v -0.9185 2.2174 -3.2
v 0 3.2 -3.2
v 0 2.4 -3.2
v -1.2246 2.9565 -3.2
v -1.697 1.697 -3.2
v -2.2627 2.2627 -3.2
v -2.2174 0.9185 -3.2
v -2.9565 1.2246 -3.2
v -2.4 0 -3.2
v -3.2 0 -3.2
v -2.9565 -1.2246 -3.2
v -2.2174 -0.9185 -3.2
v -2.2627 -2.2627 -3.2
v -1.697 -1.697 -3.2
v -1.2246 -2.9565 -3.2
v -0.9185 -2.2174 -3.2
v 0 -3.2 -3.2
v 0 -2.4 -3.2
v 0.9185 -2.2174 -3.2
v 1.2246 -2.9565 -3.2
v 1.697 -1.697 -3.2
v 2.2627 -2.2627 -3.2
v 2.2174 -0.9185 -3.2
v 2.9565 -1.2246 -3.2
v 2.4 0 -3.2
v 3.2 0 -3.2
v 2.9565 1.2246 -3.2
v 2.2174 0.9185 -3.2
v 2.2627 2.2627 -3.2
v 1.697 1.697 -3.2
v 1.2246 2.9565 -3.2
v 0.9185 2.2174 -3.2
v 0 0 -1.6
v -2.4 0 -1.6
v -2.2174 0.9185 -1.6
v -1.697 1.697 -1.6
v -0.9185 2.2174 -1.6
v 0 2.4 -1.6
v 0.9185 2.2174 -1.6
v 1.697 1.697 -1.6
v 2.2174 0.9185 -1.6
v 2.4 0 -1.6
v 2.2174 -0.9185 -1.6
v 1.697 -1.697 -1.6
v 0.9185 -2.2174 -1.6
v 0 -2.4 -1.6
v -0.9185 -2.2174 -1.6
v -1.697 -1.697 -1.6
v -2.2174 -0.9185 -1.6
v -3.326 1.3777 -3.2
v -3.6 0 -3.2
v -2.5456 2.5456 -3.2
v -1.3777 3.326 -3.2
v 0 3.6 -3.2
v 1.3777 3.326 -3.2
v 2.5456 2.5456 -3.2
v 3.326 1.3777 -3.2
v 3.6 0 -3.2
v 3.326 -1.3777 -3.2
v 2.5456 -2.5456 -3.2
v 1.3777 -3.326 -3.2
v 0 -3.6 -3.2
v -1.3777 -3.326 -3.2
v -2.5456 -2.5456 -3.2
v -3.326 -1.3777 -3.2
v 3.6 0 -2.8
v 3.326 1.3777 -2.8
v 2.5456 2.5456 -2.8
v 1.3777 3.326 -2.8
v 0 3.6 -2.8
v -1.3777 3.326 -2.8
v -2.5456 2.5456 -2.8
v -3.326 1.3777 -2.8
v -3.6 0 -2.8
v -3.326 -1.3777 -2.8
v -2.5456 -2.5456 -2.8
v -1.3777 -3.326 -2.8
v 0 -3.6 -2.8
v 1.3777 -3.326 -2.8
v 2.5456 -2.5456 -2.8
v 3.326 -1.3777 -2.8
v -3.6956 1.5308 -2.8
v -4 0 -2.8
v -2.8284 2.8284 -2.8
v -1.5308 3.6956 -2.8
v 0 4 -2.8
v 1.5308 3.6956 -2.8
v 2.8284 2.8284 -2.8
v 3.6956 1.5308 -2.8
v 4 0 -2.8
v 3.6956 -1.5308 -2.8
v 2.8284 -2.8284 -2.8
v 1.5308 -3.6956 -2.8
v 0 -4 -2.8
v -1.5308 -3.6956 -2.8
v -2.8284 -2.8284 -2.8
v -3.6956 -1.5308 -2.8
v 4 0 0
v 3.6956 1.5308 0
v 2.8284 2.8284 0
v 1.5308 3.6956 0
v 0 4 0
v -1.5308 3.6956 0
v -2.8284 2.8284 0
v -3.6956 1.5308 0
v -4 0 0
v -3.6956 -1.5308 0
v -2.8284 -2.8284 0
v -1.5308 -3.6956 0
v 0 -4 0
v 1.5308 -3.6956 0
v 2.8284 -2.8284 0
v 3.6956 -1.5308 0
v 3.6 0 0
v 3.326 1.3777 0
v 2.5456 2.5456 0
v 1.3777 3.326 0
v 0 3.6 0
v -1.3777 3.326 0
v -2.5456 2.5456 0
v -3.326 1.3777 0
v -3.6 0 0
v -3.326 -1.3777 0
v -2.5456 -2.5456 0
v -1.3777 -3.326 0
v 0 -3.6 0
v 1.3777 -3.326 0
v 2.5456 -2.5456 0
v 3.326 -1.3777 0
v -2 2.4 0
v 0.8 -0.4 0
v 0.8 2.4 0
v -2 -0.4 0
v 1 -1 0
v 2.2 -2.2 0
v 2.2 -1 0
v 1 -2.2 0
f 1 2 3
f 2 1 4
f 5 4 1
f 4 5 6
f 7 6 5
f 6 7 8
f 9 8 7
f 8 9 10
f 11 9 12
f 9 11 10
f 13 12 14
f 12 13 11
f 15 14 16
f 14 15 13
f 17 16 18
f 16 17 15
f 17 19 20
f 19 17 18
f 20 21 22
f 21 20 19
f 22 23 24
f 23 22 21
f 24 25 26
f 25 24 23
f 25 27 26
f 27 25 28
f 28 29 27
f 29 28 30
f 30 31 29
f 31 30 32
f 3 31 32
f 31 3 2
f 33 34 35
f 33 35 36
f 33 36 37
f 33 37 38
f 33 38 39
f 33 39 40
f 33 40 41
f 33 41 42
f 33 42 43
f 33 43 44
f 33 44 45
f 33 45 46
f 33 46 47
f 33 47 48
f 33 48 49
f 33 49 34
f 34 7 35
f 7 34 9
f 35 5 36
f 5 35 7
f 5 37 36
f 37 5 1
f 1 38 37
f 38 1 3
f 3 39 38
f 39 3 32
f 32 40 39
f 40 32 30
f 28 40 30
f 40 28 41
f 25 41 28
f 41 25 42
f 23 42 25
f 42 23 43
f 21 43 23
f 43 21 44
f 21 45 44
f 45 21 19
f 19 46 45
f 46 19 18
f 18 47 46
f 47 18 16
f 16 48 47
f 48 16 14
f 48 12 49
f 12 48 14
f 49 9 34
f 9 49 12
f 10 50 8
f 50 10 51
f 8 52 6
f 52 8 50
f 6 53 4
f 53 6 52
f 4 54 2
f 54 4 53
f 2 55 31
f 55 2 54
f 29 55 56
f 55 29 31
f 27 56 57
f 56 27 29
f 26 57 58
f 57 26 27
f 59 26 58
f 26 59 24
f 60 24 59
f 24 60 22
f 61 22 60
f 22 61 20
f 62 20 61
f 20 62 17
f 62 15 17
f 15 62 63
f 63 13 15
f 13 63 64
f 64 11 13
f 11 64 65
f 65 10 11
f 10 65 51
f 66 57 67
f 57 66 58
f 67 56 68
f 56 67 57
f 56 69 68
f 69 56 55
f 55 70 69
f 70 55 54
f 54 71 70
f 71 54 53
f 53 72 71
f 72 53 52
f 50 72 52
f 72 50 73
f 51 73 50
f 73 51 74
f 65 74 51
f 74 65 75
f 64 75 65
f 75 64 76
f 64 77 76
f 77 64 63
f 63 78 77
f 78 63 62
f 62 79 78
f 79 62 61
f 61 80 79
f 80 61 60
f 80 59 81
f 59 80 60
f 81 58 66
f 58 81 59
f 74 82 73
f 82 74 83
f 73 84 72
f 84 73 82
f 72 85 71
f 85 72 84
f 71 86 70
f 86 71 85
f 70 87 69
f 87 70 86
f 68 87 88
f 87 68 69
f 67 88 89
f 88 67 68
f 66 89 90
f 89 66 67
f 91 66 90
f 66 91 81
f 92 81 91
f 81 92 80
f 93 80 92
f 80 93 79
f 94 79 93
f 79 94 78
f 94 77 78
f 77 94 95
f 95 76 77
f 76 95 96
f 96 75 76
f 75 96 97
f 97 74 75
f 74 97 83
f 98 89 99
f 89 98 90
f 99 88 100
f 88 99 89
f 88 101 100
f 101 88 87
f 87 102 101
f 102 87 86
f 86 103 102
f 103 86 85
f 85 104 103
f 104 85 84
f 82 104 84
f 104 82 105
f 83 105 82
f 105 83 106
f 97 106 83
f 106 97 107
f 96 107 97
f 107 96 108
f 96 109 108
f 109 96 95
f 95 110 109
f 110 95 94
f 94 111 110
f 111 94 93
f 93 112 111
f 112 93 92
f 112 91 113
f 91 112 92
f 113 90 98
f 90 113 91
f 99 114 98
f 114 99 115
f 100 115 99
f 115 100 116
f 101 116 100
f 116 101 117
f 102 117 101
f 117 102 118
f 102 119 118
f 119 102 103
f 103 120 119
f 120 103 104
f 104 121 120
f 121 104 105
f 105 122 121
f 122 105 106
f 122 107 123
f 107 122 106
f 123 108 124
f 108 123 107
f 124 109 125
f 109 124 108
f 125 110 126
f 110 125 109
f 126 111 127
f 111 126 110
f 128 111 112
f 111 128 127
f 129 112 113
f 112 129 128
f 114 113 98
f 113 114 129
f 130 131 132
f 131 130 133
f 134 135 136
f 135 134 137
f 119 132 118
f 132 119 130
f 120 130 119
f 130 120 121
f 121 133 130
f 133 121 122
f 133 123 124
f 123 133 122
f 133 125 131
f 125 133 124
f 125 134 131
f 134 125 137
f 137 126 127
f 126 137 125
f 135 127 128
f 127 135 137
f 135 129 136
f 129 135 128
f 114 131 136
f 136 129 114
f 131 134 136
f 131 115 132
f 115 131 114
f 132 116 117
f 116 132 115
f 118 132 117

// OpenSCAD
// file: ../p/4-4disc.scad
use <../lib.scad>
function ldraw_lib__4_4disc() = [
// 0 Disc 1.0
// 0 Name: 4-4disc.dat
// 0 Author: James Jessiman
// 0 !LDRAW_ORG Primitive UPDATE 2002-02
// 0 !LICENSE Licensed under CC BY 4.0 : see CAreadme.txt
// 
// 0 BFC CERTIFY CCW
  [0,"BFC","CERTIFY"],
  [0,"BFC","CCW"],
// 
// 0 !HISTORY 1998-12-15 [PTadmin] Official Update 1998-10
// 0 !HISTORY 2002-03-23 [sbliss] Added BFC statement
// 0 !HISTORY 2002-04-25 [PTadmin] Official Update 2002-02
// 0 !HISTORY 2007-06-24 [PTadmin] Header formatted for Contributor Agreement
// 0 !HISTORY 2008-07-01 [PTadmin] Official Update 2008-01
// 
// 
// 3 16 0 0 0 1 0 0 0.9239 0 0.3827
  [3,16,0,0,0,1,0,0,0.9239,0,0.3827],
// 3 16 0 0 0 0.9239 0 0.3827 0.7071 0 0.7071
  [3,16,0,0,0,0.9239,0,0.3827,0.7071,0,0.7071],
// 3 16 0 0 0 0.7071 0 0.7071 0.3827 0 0.9239
  [3,16,0,0,0,0.7071,0,0.7071,0.3827,0,0.9239],
// 3 16 0 0 0 0.3827 0 0.9239 0 0 1
  [3,16,0,0,0,0.3827,0,0.9239,0,0,1],
// 3 16 0 0 0 0 0 1 -0.3827 0 0.9239
  [3,16,0,0,0,0,0,1,-0.3827,0,0.9239],
// 3 16 0 0 0 -0.3827 0 0.9239 -0.7071 0 0.7071
  [3,16,0,0,0,-0.3827,0,0.9239,-0.7071,0,0.7071],
// 3 16 0 0 0 -0.7071 0 0.7071 -0.9239 0 0.3827
  [3,16,0,0,0,-0.7071,0,0.7071,-0.9239,0,0.3827],
// 3 16 0 0 0 -0.9239 0 0.3827 -1 0 -0
  [3,16,0,0,0,-0.9239,0,0.3827,-1,0,-0],
// 3 16 0 0 0 -1 0 -0 -0.9239 0 -0.3827
  [3,16,0,0,0,-1,0,-0,-0.9239,0,-0.3827],
// 3 16 0 0 0 -0.9239 0 -0.3827 -0.7071 0 -0.7071
  [3,16,0,0,0,-0.9239,0,-0.3827,-0.7071,0,-0.7071],
// 3 16 0 0 0 -0.7071 0 -0.7071 -0.3827 0 -0.9239
  [3,16,0,0,0,-0.7071,0,-0.7071,-0.3827,0,-0.9239],
// 3 16 0 0 0 -0.3827 0 -0.9239 0 0 -1
  [3,16,0,0,0,-0.3827,0,-0.9239,0,0,-1],
// 3 16 0 0 0 0 0 -1 0.3827 0 -0.9239
  [3,16,0,0,0,0,0,-1,0.3827,0,-0.9239],
// 3 16 0 0 0 0.3827 0 -0.9239 0.7071 0 -0.7071
  [3,16,0,0,0,0.3827,0,-0.9239,0.7071,0,-0.7071],
// 3 16 0 0 0 0.7071 0 -0.7071 0.9239 0 -0.3827
  [3,16,0,0,0,0.7071,0,-0.7071,0.9239,0,-0.3827],
// 3 16 0 0 0 0.9239 0 -0.3827 1 0 0
  [3,16,0,0,0,0.9239,0,-0.3827,1,0,0],
// 0
];
module ldraw_lib__4_4disc(step=0, col=false, unit=2/5, alt=false, line=0.2, solid=!$preview)
    makepoly(ldraw_lib__4_4disc(), step=step, col=col, unit=unit, alt=alt, line=line, solid=solid);
ldraw_lib__4_4disc(line=0.2);
// file: ../p/4-4ring3.scad
use <../lib.scad>
function ldraw_lib__4_4ring3() = [
// 0 Ring  3 x 1.0
// 0 Name: 4-4ring3.dat
// 0 Author: James Jessiman
// 0 !LDRAW_ORG Primitive UPDATE 2009-01
// 0 !LICENSE Licensed under CC BY 4.0 : see CAreadme.txt
// 
// 0 BFC CERTIFY CCW
  [0,"BFC","CERTIFY"],
  [0,"BFC","CCW"],
// 
// 0 !HISTORY 1998-12-15 [PTadmin] Official Update 1998-10
// 0 !HISTORY 2002-04-05 [hafhead] Added BFC statement
// 0 !HISTORY 2002-04-25 [PTadmin] Official Update 2002-02
// 0 !HISTORY 2007-06-24 [PTadmin] Header formatted for Contributor Agreement
// 0 !HISTORY 2008-07-01 [PTadmin] Official Update 2008-01
// 0 !HISTORY 2008-08-26 [cwdee] Switch polygon winding and rename
// 0 !HISTORY 2009-05-02 [PTadmin] Official Update 2009-01
// 
// 
// 4 16 -1.5308 0 3.6956 -1.1481 0 2.7717 0 0 3 0 0 4
  [4,16,-1.5308,0,3.6956,-1.1481,0,2.7717,0,0,3,0,0,4],
// 4 16 -2.8284 0 2.8284 -2.1213 0 2.1213 -1.1481 0 2.7717 -1.5308 0 3.6956
  [4,16,-2.8284,0,2.8284,-2.1213,0,2.1213,-1.1481,0,2.7717,-1.5308,0,3.6956],
// 4 16 -3.6956 0 1.5308 -2.7717 0 1.1481 -2.1213 0 2.1213 -2.8284 0 2.8284
  [4,16,-3.6956,0,1.5308,-2.7717,0,1.1481,-2.1213,0,2.1213,-2.8284,0,2.8284],
// 4 16 -4 0 0 -3 0 0 -2.7717 0 1.1481 -3.6956 0 1.5308
  [4,16,-4,0,0,-3,0,0,-2.7717,0,1.1481,-3.6956,0,1.5308],
// 4 16 -3.6956 0 -1.5308 -2.7717 0 -1.1481 -3 0 0 -4 0 0
  [4,16,-3.6956,0,-1.5308,-2.7717,0,-1.1481,-3,0,0,-4,0,0],
// 4 16 -2.8284 0 -2.8284 -2.1213 0 -2.1213 -2.7717 0 -1.1481 -3.6956 0 -1.5308
  [4,16,-2.8284,0,-2.8284,-2.1213,0,-2.1213,-2.7717,0,-1.1481,-3.6956,0,-1.5308],
// 4 16 -1.5308 0 -3.6956 -1.1481 0 -2.7717 -2.1213 0 -2.1213 -2.8284 0 -2.8284
  [4,16,-1.5308,0,-3.6956,-1.1481,0,-2.7717,-2.1213,0,-2.1213,-2.8284,0,-2.8284],
// 4 16 0 0 -4 0 0 -3 -1.1481 0 -2.7717 -1.5308 0 -3.6956
  [4,16,0,0,-4,0,0,-3,-1.1481,0,-2.7717,-1.5308,0,-3.6956],
// 4 16 1.5308 0 -3.6956 1.1481 0 -2.7717 0 0 -3 0 0 -4
  [4,16,1.5308,0,-3.6956,1.1481,0,-2.7717,0,0,-3,0,0,-4],
// 4 16 2.8284 0 -2.8284 2.1213 0 -2.1213 1.1481 0 -2.7717 1.5308 0 -3.6956
  [4,16,2.8284,0,-2.8284,2.1213,0,-2.1213,1.1481,0,-2.7717,1.5308,0,-3.6956],
// 4 16 3.6956 0 -1.5308 2.7717 0 -1.1481 2.1213 0 -2.1213 2.8284 0 -2.8284
  [4,16,3.6956,0,-1.5308,2.7717,0,-1.1481,2.1213,0,-2.1213,2.8284,0,-2.8284],
// 4 16 4 0 0 3 0 0 2.7717 0 -1.1481 3.6956 0 -1.5308
  [4,16,4,0,0,3,0,0,2.7717,0,-1.1481,3.6956,0,-1.5308],
// 4 16 3.6956 0 1.5308 2.7717 0 1.1481 3 0 0 4 0 0
  [4,16,3.6956,0,1.5308,2.7717,0,1.1481,3,0,0,4,0,0],
// 4 16 2.8284 0 2.8284 2.1213 0 2.1213 2.7717 0 1.1481 3.6956 0 1.5308
  [4,16,2.8284,0,2.8284,2.1213,0,2.1213,2.7717,0,1.1481,3.6956,0,1.5308],
// 4 16 1.5308 0 3.6956 1.1481 0 2.7717 2.1213 0 2.1213 2.8284 0 2.8284
  [4,16,1.5308,0,3.6956,1.1481,0,2.7717,2.1213,0,2.1213,2.8284,0,2.8284],
// 4 16 0 0 4 0 0 3 1.1481 0 2.7717 1.5308 0 3.6956
  [4,16,0,0,4,0,0,3,1.1481,0,2.7717,1.5308,0,3.6956],
// 0
];
module ldraw_lib__4_4ring3(step=0, col=false, unit=2/5, alt=false, line=0.2, solid=!$preview)
    makepoly(ldraw_lib__4_4ring3(), step=step, col=col, unit=unit, alt=alt, line=line, solid=solid);
ldraw_lib__4_4ring3(line=0.2);
// file: ../p/4-4cylc.scad
use <../lib.scad>
use <4-4cyli.scad>
use <4-4disc.scad>
use <4-4edge.scad>
function ldraw_lib__4_4cylc() = [
// 0 Cylinder Closed 1.0
// 0 Name: 4-4cylc.dat
// 0 Author: Alex Taylor [anathema]
// 0 !LDRAW_ORG Primitive UPDATE 2009-02
// 0 !LICENSE Licensed under CC BY 2.0 and CC BY 4.0 : see CAreadme.txt
// 
// 0 BFC CERTIFY CCW
  [0,"BFC","CERTIFY"],
  [0,"BFC","CCW"],
// 
// 0 !HISTORY 2008-12-29 [cwdee] Removed one disc
// 0 !HISTORY 2009-09-03 [PTadmin] Official Update 2009-02
// 
// 
// 1 16 0 0 0 1 0 0 0 1 0 0 0 1 4-4edge.dat
  [1,16,0,0,0,1,0,0,0,1,0,0,0,1, ldraw_lib__4_4edge()],
// 1 16 0 1 0 1 0 0 0 1 0 0 0 1 4-4edge.dat
  [1,16,0,1,0,1,0,0,0,1,0,0,0,1, ldraw_lib__4_4edge()],
// 1 16 0 0 0 1 0 0 0 1 0 0 0 1 4-4disc.dat
  [1,16,0,0,0,1,0,0,0,1,0,0,0,1, ldraw_lib__4_4disc()],
// 1 16 0 0 0 1 0 0 0 1 0 0 0 1 4-4cyli.dat
  [1,16,0,0,0,1,0,0,0,1,0,0,0,1, ldraw_lib__4_4cyli()],
// 0
];
module ldraw_lib__4_4cylc(step=0, col=false, unit=2/5, alt=false, line=0.2, solid=!$preview)
    makepoly(ldraw_lib__4_4cylc(), step=step, col=col, unit=unit, alt=alt, line=line, solid=solid);
ldraw_lib__4_4cylc(line=0.2);
// file: ../p/4-4edge.scad
use <../lib.scad>
function ldraw_lib__4_4edge() = [
// 0 Circle 1.0
// 0 Name: 4-4edge.dat
// 0 Author: James Jessiman
// 0 !LDRAW_ORG Primitive UPDATE 2017-01
// 0 !LICENSE Licensed under CC BY 4.0 : see CAreadme.txt
// 
// 0 BFC CERTIFY CCW
  [0,"BFC","CERTIFY"],
  [0,"BFC","CCW"],
// 
// 0 !HISTORY 1998-12-15 [PTadmin] Official Update 1998-10
// 0 !HISTORY 2005-12-28 [PTadmin] Official Update 2005-01
// 0 !HISTORY 2007-06-24 [PTadmin] Header formatted for Contributor Agreement
// 0 !HISTORY 2008-07-01 [PTadmin] Official Update 2008-01
// 0 !HISTORY 2017-01-15 [Steffen] BFCed
// 0 !HISTORY 2017-12-30 [PTadmin] Official Update 2017-01
// 
// 
// 2 24 1 0 0 0.9239 0 0.3827
  [2,24,1,0,0,0.9239,0,0.3827],
// 2 24 0.9239 0 0.3827 0.7071 0 0.7071
  [2,24,0.9239,0,0.3827,0.7071,0,0.7071],
// 2 24 0.7071 0 0.7071 0.3827 0 0.9239
  [2,24,0.7071,0,0.7071,0.3827,0,0.9239],
// 2 24 0.3827 0 0.9239 0 0 1
  [2,24,0.3827,0,0.9239,0,0,1],
// 2 24 0 0 1 -0.3827 0 0.9239
  [2,24,0,0,1,-0.3827,0,0.9239],
// 2 24 -0.3827 0 0.9239 -0.7071 0 0.7071
  [2,24,-0.3827,0,0.9239,-0.7071,0,0.7071],
// 2 24 -0.7071 0 0.7071 -0.9239 0 0.3827
  [2,24,-0.7071,0,0.7071,-0.9239,0,0.3827],
// 2 24 -0.9239 0 0.3827 -1 0 -0
  [2,24,-0.9239,0,0.3827,-1,0,-0],
// 2 24 -1 0 -0 -0.9239 0 -0.3827
  [2,24,-1,0,-0,-0.9239,0,-0.3827],
// 2 24 -0.9239 0 -0.3827 -0.7071 0 -0.7071
  [2,24,-0.9239,0,-0.3827,-0.7071,0,-0.7071],
// 2 24 -0.7071 0 -0.7071 -0.3827 0 -0.9239
  [2,24,-0.7071,0,-0.7071,-0.3827,0,-0.9239],
// 2 24 -0.3827 0 -0.9239 0 0 -1
  [2,24,-0.3827,0,-0.9239,0,0,-1],
// 2 24 0 0 -1 0.3827 0 -0.9239
  [2,24,0,0,-1,0.3827,0,-0.9239],
// 2 24 0.3827 0 -0.9239 0.7071 0 -0.7071
  [2,24,0.3827,0,-0.9239,0.7071,0,-0.7071],
// 2 24 0.7071 0 -0.7071 0.9239 0 -0.3827
  [2,24,0.7071,0,-0.7071,0.9239,0,-0.3827],
// 2 24 0.9239 0 -0.3827 1 0 0
  [2,24,0.9239,0,-0.3827,1,0,0],
];
module ldraw_lib__4_4edge(step=0, col=false, unit=2/5, alt=false, line=0.2, solid=!$preview)
    makepoly(ldraw_lib__4_4edge(), step=step, col=col, unit=unit, alt=alt, line=line, solid=solid);
ldraw_lib__4_4edge(line=0.2);
// file: ../p/4-4cyli.scad
use <../lib.scad>
function ldraw_lib__4_4cyli() = [
// 0 Cylinder 1.0
// 0 Name: 4-4cyli.dat
// 0 Author: James Jessiman
// 0 !LDRAW_ORG Primitive UPDATE 2005-01
// 0 !LICENSE Licensed under CC BY 4.0 : see CAreadme.txt
// 
// 0 BFC CERTIFY CCW
  [0,"BFC","CERTIFY"],
  [0,"BFC","CCW"],
// 
// 0 !HISTORY 1998-12-15 [PTadmin] Official Update 1998-10
// 0 !HISTORY 2002-03-23 [sbliss] Added BFC statement; merged headers from files in distributions LDraw 0.27 and Complete.
// 0 !HISTORY 2002-04-25 [PTadmin] Official Update 2002-02
// 0 !HISTORY 2004-12-14 [guyvivan] BFC CCW
// 0 !HISTORY 2005-12-28 [PTadmin] Official Update 2005-01
// 0 !HISTORY 2007-06-24 [PTadmin] Header formatted for Contributor Agreement
// 0 !HISTORY 2008-07-01 [PTadmin] Official Update 2008-01
// 
// 
// 4 16 1 1 0 0.9239 1 0.3827 0.9239 0 0.3827 1 0 0
  [4,16,1,1,0,0.9239,1,0.3827,0.9239,0,0.3827,1,0,0],
// 5 24 1 0 0 1 1 0 0.9239 0 0.3827 0.9239 0 -0.3827
  [5,24,1,0,0,1,1,0,0.9239,0,0.3827,0.9239,0,-0.3827],
// 4 16 0.9239 1 0.3827 0.7071 1 0.7071 0.7071 0 0.7071 0.9239 0 0.3827
  [4,16,0.9239,1,0.3827,0.7071,1,0.7071,0.7071,0,0.7071,0.9239,0,0.3827],
// 5 24 0.9239 0 0.3827 0.9239 1 0.3827 0.7071 0 0.7071 1 0 0
  [5,24,0.9239,0,0.3827,0.9239,1,0.3827,0.7071,0,0.7071,1,0,0],
// 4 16 0.7071 1 0.7071 0.3827 1 0.9239 0.3827 0 0.9239 0.7071 0 0.7071
  [4,16,0.7071,1,0.7071,0.3827,1,0.9239,0.3827,0,0.9239,0.7071,0,0.7071],
// 5 24 0.7071 0 0.7071 0.7071 1 0.7071 0.3827 0 0.9239 0.9239 0 0.3827
  [5,24,0.7071,0,0.7071,0.7071,1,0.7071,0.3827,0,0.9239,0.9239,0,0.3827],
// 4 16 0.3827 1 0.9239 0 1 1 0 0 1 0.3827 0 0.9239
  [4,16,0.3827,1,0.9239,0,1,1,0,0,1,0.3827,0,0.9239],
// 5 24 0.3827 0 0.9239 0.3827 1 0.9239 0 0 1 0.7071 0 0.7071
  [5,24,0.3827,0,0.9239,0.3827,1,0.9239,0,0,1,0.7071,0,0.7071],
// 4 16 0 1 1 -0.3827 1 0.9239 -0.3827 0 0.9239 0 0 1
  [4,16,0,1,1,-0.3827,1,0.9239,-0.3827,0,0.9239,0,0,1],
// 5 24 0 0 1 0 1 1 -0.3827 0 0.9239 0.3827 0 0.9239
  [5,24,0,0,1,0,1,1,-0.3827,0,0.9239,0.3827,0,0.9239],
// 4 16 -0.3827 1 0.9239 -0.7071 1 0.7071 -0.7071 0 0.7071 -0.3827 0 0.9239
  [4,16,-0.3827,1,0.9239,-0.7071,1,0.7071,-0.7071,0,0.7071,-0.3827,0,0.9239],
// 5 24 -0.3827 0 0.9239 -0.3827 1 0.9239 -0.7071 0 0.7071 0 0 1
  [5,24,-0.3827,0,0.9239,-0.3827,1,0.9239,-0.7071,0,0.7071,0,0,1],
// 4 16 -0.7071 1 0.7071 -0.9239 1 0.3827 -0.9239 0 0.3827 -0.7071 0 0.7071
  [4,16,-0.7071,1,0.7071,-0.9239,1,0.3827,-0.9239,0,0.3827,-0.7071,0,0.7071],
// 5 24 -0.7071 0 0.7071 -0.7071 1 0.7071 -0.9239 0 0.3827 -0.3827 0 0.9239
  [5,24,-0.7071,0,0.7071,-0.7071,1,0.7071,-0.9239,0,0.3827,-0.3827,0,0.9239],
// 4 16 -0.9239 1 0.3827 -1 1 0 -1 0 0 -0.9239 0 0.3827
  [4,16,-0.9239,1,0.3827,-1,1,0,-1,0,0,-0.9239,0,0.3827],
// 5 24 -0.9239 0 0.3827 -0.9239 1 0.3827 -1 0 0 -0.7071 0 0.7071
  [5,24,-0.9239,0,0.3827,-0.9239,1,0.3827,-1,0,0,-0.7071,0,0.7071],
// 4 16 -1 1 0 -0.9239 1 -0.3827 -0.9239 0 -0.3827 -1 0 0
  [4,16,-1,1,0,-0.9239,1,-0.3827,-0.9239,0,-0.3827,-1,0,0],
// 5 24 -1 0 0 -1 1 0 -0.9239 0 -0.3827 -0.9239 0 0.3827
  [5,24,-1,0,0,-1,1,0,-0.9239,0,-0.3827,-0.9239,0,0.3827],
// 4 16 -0.9239 1 -0.3827 -0.7071 1 -0.7071 -0.7071 0 -0.7071 -0.9239 0 -0.3827
  [4,16,-0.9239,1,-0.3827,-0.7071,1,-0.7071,-0.7071,0,-0.7071,-0.9239,0,-0.3827],
// 5 24 -0.9239 0 -0.3827 -0.9239 1 -0.3827 -0.7071 0 -0.7071 -1 0 0
  [5,24,-0.9239,0,-0.3827,-0.9239,1,-0.3827,-0.7071,0,-0.7071,-1,0,0],
// 4 16 -0.7071 1 -0.7071 -0.3827 1 -0.9239 -0.3827 0 -0.9239 -0.7071 0 -0.7071
  [4,16,-0.7071,1,-0.7071,-0.3827,1,-0.9239,-0.3827,0,-0.9239,-0.7071,0,-0.7071],
// 5 24 -0.7071 0 -0.7071 -0.7071 1 -0.7071 -0.3827 0 -0.9239 -0.9239 0 -0.3827
  [5,24,-0.7071,0,-0.7071,-0.7071,1,-0.7071,-0.3827,0,-0.9239,-0.9239,0,-0.3827],
// 4 16 -0.3827 1 -0.9239 0 1 -1 0 0 -1 -0.3827 0 -0.9239
  [4,16,-0.3827,1,-0.9239,0,1,-1,0,0,-1,-0.3827,0,-0.9239],
// 5 24 -0.3827 0 -0.9239 -0.3827 1 -0.9239 0 0 -1 -0.7071 0 -0.7071
  [5,24,-0.3827,0,-0.9239,-0.3827,1,-0.9239,0,0,-1,-0.7071,0,-0.7071],
// 4 16 0 1 -1 0.3827 1 -0.9239 0.3827 0 -0.9239 0 0 -1
  [4,16,0,1,-1,0.3827,1,-0.9239,0.3827,0,-0.9239,0,0,-1],
// 5 24 0 0 -1 0 1 -1 0.3827 0 -0.9239 -0.3827 0 -0.9239
  [5,24,0,0,-1,0,1,-1,0.3827,0,-0.9239,-0.3827,0,-0.9239],
// 4 16 0.3827 1 -0.9239 0.7071 1 -0.7071 0.7071 0 -0.7071 0.3827 0 -0.9239
  [4,16,0.3827,1,-0.9239,0.7071,1,-0.7071,0.7071,0,-0.7071,0.3827,0,-0.9239],
// 5 24 0.3827 0 -0.9239 0.3827 1 -0.9239 0.7071 0 -0.7071 0 0 -1
  [5,24,0.3827,0,-0.9239,0.3827,1,-0.9239,0.7071,0,-0.7071,0,0,-1],
// 4 16 0.7071 1 -0.7071 0.9239 1 -0.3827 0.9239 0 -0.3827 0.7071 0 -0.7071
  [4,16,0.7071,1,-0.7071,0.9239,1,-0.3827,0.9239,0,-0.3827,0.7071,0,-0.7071],
// 5 24 0.7071 0 -0.7071 0.7071 1 -0.7071 0.9239 0 -0.3827 0.3827 0 -0.9239
  [5,24,0.7071,0,-0.7071,0.7071,1,-0.7071,0.9239,0,-0.3827,0.3827,0,-0.9239],
// 4 16 0.9239 1 -0.3827 1 1 0 1 0 0 0.9239 0 -0.3827
  [4,16,0.9239,1,-0.3827,1,1,0,1,0,0,0.9239,0,-0.3827],
// 5 24 0.9239 0 -0.3827 0.9239 1 -0.3827 1 0 0 0.7071 0 -0.7071
  [5,24,0.9239,0,-0.3827,0.9239,1,-0.3827,1,0,0,0.7071,0,-0.7071],
// 0
];
module ldraw_lib__4_4cyli(step=0, col=false, unit=2/5, alt=false, line=0.2, solid=!$preview)
    makepoly(ldraw_lib__4_4cyli(), step=step, col=col, unit=unit, alt=alt, line=line, solid=solid);
ldraw_lib__4_4cyli(line=0.2);
// file: ../p/empty.scad
use <../lib.scad>
function ldraw_lib__empty() = [
// 0 Empty
// 0 Name: empty.dat
// 0 Author: Steffen [Steffen]
// 0 !LDRAW_ORG Primitive UPDATE 2015-01
// 0 !LICENSE Licensed under CC BY 4.0 : see CAreadme.txt
// 
// 0 BFC CERTIFY CCW
  [0,"BFC","CERTIFY"],
  [0,"BFC","CCW"],
// 
// 0 !HISTORY 2015-10-11 [PTadmin] Official Update 2015-01
// 
// 
// 0 // Tool MLCad cannot handle really empty files. This file is used as a workaround.
// 0 // It exceptionally contains forbidden non-LDRAW standard syntax to satisfy MLCad until it is fixed OR a different editor has become the de-facto LDRAW standard.
// 0 // The line being used here is an "impossible" conditional line which never should be visible,
// 0 // additionally hidden by a syntax explicitly hiding it from displaying.
// 
// 0 MLCAD HIDE 5 24 0 0 0 0.0001 0 0 0.0001 -0.0001 0 0 0 0
];
module ldraw_lib__empty(step=0, col=false, unit=2/5, alt=false, line=0.2, solid=!$preview)
    makepoly(ldraw_lib__empty(), step=step, col=col, unit=unit, alt=alt, line=line, solid=solid);
ldraw_lib__empty(line=0.2);
// file: ../p/stud4o.scad
use <../lib.scad>
use <4-4cylc.scad>
use <4-4ring3.scad>
function ldraw_lib__stud4o() = [
// 0 Stud Tube Open without Outer Cylinder
// 0 Name: stud4o.dat
// 0 Author: Magnus Forsberg [MagFors]
// 0 !LDRAW_ORG Primitive UPDATE 2011-02
// 0 !LICENSE Licensed under CC BY 4.0 : see CAreadme.txt
// 
// 0 !HELP This stud is a "antistud" to be used like a underside stud,
// 0 !HELP but without the outer cylinder.
// 0 !HELP 1 47 0 0 0 1 0 0 0 1 0 0 0 1 stud4.dat
// 
// 0 BFC CERTIFY CCW
  [0,"BFC","CERTIFY"],
  [0,"BFC","CCW"],
// 
// 0 !HISTORY 2011-12-29 [PTadmin] Official Update 2011-02
// 
// 
// 1 16 0 -4 0 2 0 0 0 1 0 0 0 2 4-4ring3.dat
  [1,16,0,-4,0,2,0,0,0,1,0,0,0,2, ldraw_lib__4_4ring3()],
// 0 BFC INVERTNEXT
  [0,"BFC","INVERTNEXT"],
// 1 16 0 0 0 -6 0 0 0 -4 0 0 0 6 4-4cylc.dat
  [1,16,0,0,0,-6,0,0,0,-4,0,0,0,6, ldraw_lib__4_4cylc()],
];
module ldraw_lib__stud4o(step=0, col=false, unit=2/5, alt=false, line=0.2, solid=!$preview)
    makepoly(ldraw_lib__stud4o(), step=step, col=col, unit=unit, alt=alt, line=line, solid=solid);
ldraw_lib__stud4o(line=0.2);
// file: ../p/4-4ring8.scad
use <../lib.scad>
function ldraw_lib__4_4ring8() = [
// 0 Ring  8 x 1.0
// 0 Name: 4-4ring8.dat
// 0 Author: Steffen [Steffen]
// 0 !LDRAW_ORG Primitive UPDATE 2012-01
// 0 !LICENSE Licensed under CC BY 4.0 : see CAreadme.txt
// 
// 0 BFC CERTIFY CCW
  [0,"BFC","CERTIFY"],
  [0,"BFC","CCW"],
// 
// 0 !HISTORY 2003-12-19 [PTadmin] Official Update 2003-03
// 0 !HISTORY 2007-06-24 [PTadmin] Header formatted for Contributor Agreement
// 0 !HISTORY 2008-07-01 [PTadmin] Official Update 2008-01
// 0 !HISTORY 2012-02-16 [Philo] Changed to CCW
// 0 !HISTORY 2012-03-30 [PTadmin] Official Update 2012-01
// 
// 
// 4 16 9 0 0 8.3151 0 3.4443 7.3912 0 3.0616 8 0 0
  [4,16,9,0,0,8.3151,0,3.4443,7.3912,0,3.0616,8,0,0],
// 4 16 8.3151 0 3.4443 6.3639 0 6.3639 5.6568 0 5.6568 7.3912 0 3.0616
  [4,16,8.3151,0,3.4443,6.3639,0,6.3639,5.6568,0,5.6568,7.3912,0,3.0616],
// 4 16 6.3639 0 6.3639 3.4443 0 8.3151 3.0616 0 7.3912 5.6568 0 5.6568
  [4,16,6.3639,0,6.3639,3.4443,0,8.3151,3.0616,0,7.3912,5.6568,0,5.6568],
// 4 16 3.4443 0 8.3151 0 0 9 0 0 8 3.0616 0 7.3912
  [4,16,3.4443,0,8.3151,0,0,9,0,0,8,3.0616,0,7.3912],
// 4 16 0 0 9 -3.4443 0 8.3151 -3.0616 0 7.3912 0 0 8
  [4,16,0,0,9,-3.4443,0,8.3151,-3.0616,0,7.3912,0,0,8],
// 4 16 -3.4443 0 8.3151 -6.3639 0 6.3639 -5.6568 0 5.6568 -3.0616 0 7.3912
  [4,16,-3.4443,0,8.3151,-6.3639,0,6.3639,-5.6568,0,5.6568,-3.0616,0,7.3912],
// 4 16 -6.3639 0 6.3639 -8.3151 0 3.4443 -7.3912 0 3.0616 -5.6568 0 5.6568
  [4,16,-6.3639,0,6.3639,-8.3151,0,3.4443,-7.3912,0,3.0616,-5.6568,0,5.6568],
// 4 16 -8.3151 0 3.4443 -9 0 0 -8 0 0 -7.3912 0 3.0616
  [4,16,-8.3151,0,3.4443,-9,0,0,-8,0,0,-7.3912,0,3.0616],
// 4 16 -9 0 0 -8.3151 0 -3.4443 -7.3912 0 -3.0616 -8 0 0
  [4,16,-9,0,0,-8.3151,0,-3.4443,-7.3912,0,-3.0616,-8,0,0],
// 4 16 -8.3151 0 -3.4443 -6.3639 0 -6.3639 -5.6568 0 -5.6568 -7.3912 0 -3.0616
  [4,16,-8.3151,0,-3.4443,-6.3639,0,-6.3639,-5.6568,0,-5.6568,-7.3912,0,-3.0616],
// 4 16 -6.3639 0 -6.3639 -3.4443 0 -8.3151 -3.0616 0 -7.3912 -5.6568 0 -5.6568
  [4,16,-6.3639,0,-6.3639,-3.4443,0,-8.3151,-3.0616,0,-7.3912,-5.6568,0,-5.6568],
// 4 16 -3.4443 0 -8.3151 0 0 -9 0 0 -8 -3.0616 0 -7.3912
  [4,16,-3.4443,0,-8.3151,0,0,-9,0,0,-8,-3.0616,0,-7.3912],
// 4 16 0 0 -9 3.4443 0 -8.3151 3.0616 0 -7.3912 0 0 -8
  [4,16,0,0,-9,3.4443,0,-8.3151,3.0616,0,-7.3912,0,0,-8],
// 4 16 3.4443 0 -8.3151 6.3639 0 -6.3639 5.6568 0 -5.6568 3.0616 0 -7.3912
  [4,16,3.4443,0,-8.3151,6.3639,0,-6.3639,5.6568,0,-5.6568,3.0616,0,-7.3912],
// 4 16 6.3639 0 -6.3639 8.3151 0 -3.4443 7.3912 0 -3.0616 5.6568 0 -5.6568
  [4,16,6.3639,0,-6.3639,8.3151,0,-3.4443,7.3912,0,-3.0616,5.6568,0,-5.6568],
// 4 16 8.3151 0 -3.4443 9 0 0 8 0 0 7.3912 0 -3.0616
  [4,16,8.3151,0,-3.4443,9,0,0,8,0,0,7.3912,0,-3.0616],
];
module ldraw_lib__4_4ring8(step=0, col=false, unit=2/5, alt=false, line=0.2, solid=!$preview)
    makepoly(ldraw_lib__4_4ring8(), step=step, col=col, unit=unit, alt=alt, line=line, solid=solid);
ldraw_lib__4_4ring8(line=0.2);
// file: ../p/4-4cylo.scad
use <../lib.scad>
use <4-4cyli.scad>
use <4-4edge.scad>
function ldraw_lib__4_4cylo() = [
// 0 Cylinder Open 1.0
// 0 Name: 4-4cylo.dat
// 0 Author: Mark Kennedy [mkennedy]
// 0 !LDRAW_ORG Primitive UPDATE 2010-01
// 0 !LICENSE Licensed under CC BY 4.0 : see CAreadme.txt
// 
// 0 BFC CERTIFY CCW
  [0,"BFC","CERTIFY"],
  [0,"BFC","CCW"],
// 
// 0 !HISTORY 2010-04-05 [PTadmin] Official Update 2010-01
// 
// 
// 1 16 0 0 0 1 0 0 0 1 0 0 0 1 4-4edge.dat
  [1,16,0,0,0,1,0,0,0,1,0,0,0,1, ldraw_lib__4_4edge()],
// 1 16 0 1 0 1 0 0 0 1 0 0 0 1 4-4edge.dat
  [1,16,0,1,0,1,0,0,0,1,0,0,0,1, ldraw_lib__4_4edge()],
// 1 16 0 0 0 1 0 0 0 1 0 0 0 1 4-4cyli.dat
  [1,16,0,0,0,1,0,0,0,1,0,0,0,1, ldraw_lib__4_4cyli()],
// 0
];
module ldraw_lib__4_4cylo(step=0, col=false, unit=2/5, alt=false, line=0.2, solid=!$preview)
    makepoly(ldraw_lib__4_4cylo(), step=step, col=col, unit=unit, alt=alt, line=line, solid=solid);
ldraw_lib__4_4cylo(line=0.2);
// file: ../p/1-16chrd.scad
use <../lib.scad>
use <empty.scad>
function ldraw_lib__1_16chrd() = [
// 0 Chord 0.0625
// 0 Name: 1-16chrd.dat
// 0 Author: Philippe Hurbain [Philo]
// 0 !LDRAW_ORG Primitive UPDATE 2015-01
// 0 !LICENSE Licensed under CC BY 4.0 : see CAreadme.txt
// 
// 0 BFC CERTIFY CCW
  [0,"BFC","CERTIFY"],
  [0,"BFC","CCW"],
// 
// 0 !HISTORY 2015-10-11 [PTadmin] Official Update 2015-01
// 
// 
// 0 // This file is intentionally empty because at the current \P resolution,
// 0 // an 1-16chrd is actually empty. However, this file still is present
// 0 // to allow tools to do primitives substition and fill in a real chrd here,
// 0 // or, if desired, to substitute this with the hi-res 48\1-16chrd.
// 
// 0 // This file is based on an idea by Darats at http://forums.ldraw.org/read.php?19,14500,14500#msg-14500
// 
// 1 16 0 0 0 1 0 0 0 1 0 0 0 1 empty.dat
  [1,16,0,0,0,1,0,0,0,1,0,0,0,1, ldraw_lib__empty()],
];
module ldraw_lib__1_16chrd(step=0, col=false, unit=2/5, alt=false, line=0.2, solid=!$preview)
    makepoly(ldraw_lib__1_16chrd(), step=step, col=col, unit=unit, alt=alt, line=line, solid=solid);
ldraw_lib__1_16chrd(line=0.2);
// file: s/98138s02.scad
use <../../lib.scad>
use <../../p/4-4cylo.scad>
use <../../p/4-4ring8.scad>
use <../../p/4-4ring9.scad>
use <../../p/stud4o.scad>
function ldraw_lib__s__98138s02() = [
// 0 ~Tile  1 x  1 Round with Groove without Complete Top Face
// 0 Name: s\98138s02.dat
// 0 Author: Magnus Forsberg [MagFors]
// 0 !LDRAW_ORG Subpart UPDATE 2020-01
// 0 !LICENSE Licensed under CC BY 4.0 : see CAreadme.txt
// 
// 0 BFC CERTIFY CCW
  [0,"BFC","CERTIFY"],
  [0,"BFC","CCW"],
// 
// 0 !HISTORY 2020-06-28 [PTadmin] Official Update 2020-01
// 
// 
// 1 16 0 4 0 1 0 0 0 -1 0 0 0 1 stud4o.dat
  [1,16,0,4,0,1,0,0,0,-1,0,0,0,1, ldraw_lib__stud4o()],
// 1 16 0 8 0 -1 0 0 0 -1 0 0 0 1 4-4ring8.dat
  [1,16,0,8,0,-1,0,0,0,-1,0,0,0,1, ldraw_lib__4_4ring8()],
// 1 16 0 7 0 9 0 0 0 1 0 0 0 9 4-4cylo.dat
  [1,16,0,7,0,9,0,0,0,1,0,0,0,9, ldraw_lib__4_4cylo()],
// 1 16 0 7 0 -1 0 0 0 -1 0 0 0 1 4-4ring9.dat
  [1,16,0,7,0,-1,0,0,0,-1,0,0,0,1, ldraw_lib__4_4ring9()],
// 1 16 0 0 0 10 0 0 0 7 0 0 0 10 4-4cylo.dat
  [1,16,0,0,0,10,0,0,0,7,0,0,0,10, ldraw_lib__4_4cylo()],
];
module ldraw_lib__s__98138s02(step=0, col=false, unit=2/5, alt=false, line=0.2, solid=!$preview)
    makepoly(ldraw_lib__s__98138s02(), step=step, col=col, unit=unit, alt=alt, line=line, solid=solid);
ldraw_lib__s__98138s02(line=0.2);
// file: ../p/4-4ring9.scad
use <../lib.scad>
function ldraw_lib__4_4ring9() = [
// 0 Ring  9 x 1.0
// 0 Name: 4-4ring9.dat
// 0 Author: John Riley [jriley]
// 0 !LDRAW_ORG Primitive UPDATE 2004-02
// 0 !LICENSE Licensed under CC BY 2.0 and CC BY 4.0 : see CAreadme.txt
// 
// 0 BFC CERTIFY CCW
  [0,"BFC","CERTIFY"],
  [0,"BFC","CCW"],
// 
// 0 !HISTORY 2004-04-22 [PTadmin] Official Update 2004-02
// 0 !HISTORY 2007-06-24 [PTadmin] Header formatted for Contributor Agreement
// 0 !HISTORY 2008-07-01 [PTadmin] Official Update 2008-01
// 
// 
// 4 16 9 0 0 10 0 0 9.239 0 3.827 8.3151 0 3.4443
  [4,16,9,0,0,10,0,0,9.239,0,3.827,8.3151,0,3.4443],
// 4 16 8.3151 0 3.4443 9.239 0 3.827 7.071 0 7.071 6.3639 0 6.3639
  [4,16,8.3151,0,3.4443,9.239,0,3.827,7.071,0,7.071,6.3639,0,6.3639],
// 4 16 6.3639 0 6.3639 7.071 0 7.071 3.827 0 9.239 3.4443 0 8.3151
  [4,16,6.3639,0,6.3639,7.071,0,7.071,3.827,0,9.239,3.4443,0,8.3151],
// 4 16 3.4443 0 8.3151 3.827 0 9.239 0 0 10 0 0 9
  [4,16,3.4443,0,8.3151,3.827,0,9.239,0,0,10,0,0,9],
// 4 16 0 0 9 0 0 10 -3.827 0 9.239 -3.4443 0 8.3151
  [4,16,0,0,9,0,0,10,-3.827,0,9.239,-3.4443,0,8.3151],
// 4 16 -3.4443 0 8.3151 -3.827 0 9.239 -7.071 0 7.071 -6.3639 0 6.3639
  [4,16,-3.4443,0,8.3151,-3.827,0,9.239,-7.071,0,7.071,-6.3639,0,6.3639],
// 4 16 -6.3639 0 6.3639 -7.071 0 7.071 -9.239 0 3.827 -8.3151 0 3.4443
  [4,16,-6.3639,0,6.3639,-7.071,0,7.071,-9.239,0,3.827,-8.3151,0,3.4443],
// 4 16 -8.3151 0 3.4443 -9.239 0 3.827 -10 0 0 -9 0 0
  [4,16,-8.3151,0,3.4443,-9.239,0,3.827,-10,0,0,-9,0,0],
// 4 16 -9 0 0 -10 0 0 -9.239 0 -3.827 -8.3151 0 -3.4443
  [4,16,-9,0,0,-10,0,0,-9.239,0,-3.827,-8.3151,0,-3.4443],
// 4 16 -8.3151 0 -3.4443 -9.239 0 -3.827 -7.071 0 -7.071 -6.3639 0 -6.3639
  [4,16,-8.3151,0,-3.4443,-9.239,0,-3.827,-7.071,0,-7.071,-6.3639,0,-6.3639],
// 4 16 -6.3639 0 -6.3639 -7.071 0 -7.071 -3.827 0 -9.239 -3.4443 0 -8.3151
  [4,16,-6.3639,0,-6.3639,-7.071,0,-7.071,-3.827,0,-9.239,-3.4443,0,-8.3151],
// 4 16 -3.4443 0 -8.3151 -3.827 0 -9.239 0 0 -10 0 0 -9
  [4,16,-3.4443,0,-8.3151,-3.827,0,-9.239,0,0,-10,0,0,-9],
// 4 16 0 0 -9 0 0 -10 3.827 0 -9.239 3.4443 0 -8.3151
  [4,16,0,0,-9,0,0,-10,3.827,0,-9.239,3.4443,0,-8.3151],
// 4 16 3.4443 0 -8.3151 3.827 0 -9.239 7.071 0 -7.071 6.3639 0 -6.3639
  [4,16,3.4443,0,-8.3151,3.827,0,-9.239,7.071,0,-7.071,6.3639,0,-6.3639],
// 4 16 6.3639 0 -6.3639 7.071 0 -7.071 9.239 0 -3.827 8.3151 0 -3.4443
  [4,16,6.3639,0,-6.3639,7.071,0,-7.071,9.239,0,-3.827,8.3151,0,-3.4443],
// 4 16 8.3151 0 -3.4443 9.239 0 -3.827 10 0 0 9 0 0
  [4,16,8.3151,0,-3.4443,9.239,0,-3.827,10,0,0,9,0,0],
// 0
];
module ldraw_lib__4_4ring9(step=0, col=false, unit=2/5, alt=false, line=0.2, solid=!$preview)
    makepoly(ldraw_lib__4_4ring9(), step=step, col=col, unit=unit, alt=alt, line=line, solid=solid);
ldraw_lib__4_4ring9(line=0.2);
// file: ../p/4-4ering.scad
use <../lib.scad>
use <1-16chrd.scad>
function ldraw_lib__4_4ering() = [
// 0 Adapter Ring Triangles to Normal 1.0
// 0 Name: 4-4ering.dat
// 0 Author: Philippe Hurbain [Philo]
// 0 !LDRAW_ORG Primitive UPDATE 2015-01
// 0 !LICENSE Licensed under CC BY 4.0 : see CAreadme.txt
// 
// 0 BFC CERTIFY CCW
  [0,"BFC","CERTIFY"],
  [0,"BFC","CCW"],
// 
// 0 !HISTORY 2015-10-11 [PTadmin] Official Update 2015-01
// 
// 
// 0 // This file uses 1-16chrd (actually empty). It allows
// 0 // tools to do primitives substition and fill in a ring of chrd here,
// 0 // or, if desired, to substitute this with the hi-res 48\1-16chrd.
// 0 // This file is based on an idea by Darats at http://forums.ldraw.org/read.php?19,14500,14500#msg-14500
// 
// 1 16 0 0 0 1 0 0 0 1 0 0 0 1 1-16chrd.dat
  [1,16,0,0,0,1,0,0,0,1,0,0,0,1, ldraw_lib__1_16chrd()],
// 1 16 0 0 0 0.92388 0 0.38268 0 1 0 -0.38268 0 0.92388 1-16chrd.dat
  [1,16,0,0,0,0.92388,0,0.38268,0,1,0,-0.38268,0,0.92388, ldraw_lib__1_16chrd()],
// 1 16 0 0 0 0.70711 0 0.70711 0 1 0 -0.70711 0 0.70711 1-16chrd.dat
  [1,16,0,0,0,0.70711,0,0.70711,0,1,0,-0.70711,0,0.70711, ldraw_lib__1_16chrd()],
// 1 16 0 0 0 0.38268 0 0.92388 0 1 0 -0.92388 0 0.38268 1-16chrd.dat
  [1,16,0,0,0,0.38268,0,0.92388,0,1,0,-0.92388,0,0.38268, ldraw_lib__1_16chrd()],
// 1 16 0 0 0 0 0 1 0 1 0 -1 0 0 1-16chrd.dat
  [1,16,0,0,0,0,0,1,0,1,0,-1,0,0, ldraw_lib__1_16chrd()],
// 1 16 0 0 0 -0.38268 0 0.92388 0 1 0 -0.92388 0 -0.38268 1-16chrd.dat
  [1,16,0,0,0,-0.38268,0,0.92388,0,1,0,-0.92388,0,-0.38268, ldraw_lib__1_16chrd()],
// 1 16 0 0 0 -0.70711 0 0.70711 0 1 0 -0.70711 0 -0.70711 1-16chrd.dat
  [1,16,0,0,0,-0.70711,0,0.70711,0,1,0,-0.70711,0,-0.70711, ldraw_lib__1_16chrd()],
// 1 16 0 0 0 -0.92388 0 0.38268 0 1 0 -0.38268 0 -0.92388 1-16chrd.dat
  [1,16,0,0,0,-0.92388,0,0.38268,0,1,0,-0.38268,0,-0.92388, ldraw_lib__1_16chrd()],
// 1 16 0 0 0 0 0 -1 0 1 0 1 0 0 1-16chrd.dat
  [1,16,0,0,0,0,0,-1,0,1,0,1,0,0, ldraw_lib__1_16chrd()],
// 1 16 0 0 0 0.38268 0 -0.92388 0 1 0 0.92388 0 0.38268 1-16chrd.dat
  [1,16,0,0,0,0.38268,0,-0.92388,0,1,0,0.92388,0,0.38268, ldraw_lib__1_16chrd()],
// 1 16 0 0 0 0.70711 0 -0.70711 0 1 0 0.70711 0 0.70711 1-16chrd.dat
  [1,16,0,0,0,0.70711,0,-0.70711,0,1,0,0.70711,0,0.70711, ldraw_lib__1_16chrd()],
// 1 16 0 0 0 0.92388 0 -0.38268 0 1 0 0.38268 0 0.92388 1-16chrd.dat
  [1,16,0,0,0,0.92388,0,-0.38268,0,1,0,0.38268,0,0.92388, ldraw_lib__1_16chrd()],
// 1 16 0 0 0 -1 0 0 0 1 0 0 0 -1 1-16chrd.dat
  [1,16,0,0,0,-1,0,0,0,1,0,0,0,-1, ldraw_lib__1_16chrd()],
// 1 16 0 0 0 -0.92388 0 -0.38268 0 1 0 0.38268 0 -0.92388 1-16chrd.dat
  [1,16,0,0,0,-0.92388,0,-0.38268,0,1,0,0.38268,0,-0.92388, ldraw_lib__1_16chrd()],
// 1 16 0 0 0 -0.70711 0 -0.70711 0 1 0 0.70711 0 -0.70711 1-16chrd.dat
  [1,16,0,0,0,-0.70711,0,-0.70711,0,1,0,0.70711,0,-0.70711, ldraw_lib__1_16chrd()],
// 1 16 0 0 0 -0.38268 0 -0.92388 0 1 0 0.92388 0 -0.38268 1-16chrd.dat
  [1,16,0,0,0,-0.38268,0,-0.92388,0,1,0,0.92388,0,-0.38268, ldraw_lib__1_16chrd()],
];
module ldraw_lib__4_4ering(step=0, col=false, unit=2/5, alt=false, line=0.2, solid=!$preview)
    makepoly(ldraw_lib__4_4ering(), step=step, col=col, unit=unit, alt=alt, line=line, solid=solid);
ldraw_lib__4_4ering(line=0.2);
// file: s/98138s01.scad
use <../../lib.scad>
use <../../p/4-4ring9.scad>
use <98138s02.scad>
function ldraw_lib__s__98138s01() = [
// 0 ~Tile  1 x  1 Round with Groove with Partial Top Face
// 0 Name: s\98138s01.dat
// 0 Author: Magnus Forsberg [MagFors]
// 0 !LDRAW_ORG Subpart UPDATE 2020-01
// 0 !LICENSE Licensed under CC BY 4.0 : see CAreadme.txt
// 
// 0 BFC CERTIFY CCW
  [0,"BFC","CERTIFY"],
  [0,"BFC","CCW"],
// 
// 0 !HISTORY 2011-12-29 [PTadmin] Official Update 2011-02
// 0 !HISTORY 2016-06-17 [MagFors] Reduced the rounded edge to 0.5 ldu
// 0 !HISTORY 2016-12-31 [PTadmin] Official Update 2016-01
// 0 !HISTORY 2019-06-17 [MagFors] Removed the rounded edge
// 0 !HISTORY 2019-07-19 [MagFors] Subfiled without top surface
// 0 !HISTORY 2020-06-28 [PTadmin] Official Update 2020-01
// 
// 
// 1 16 0 0 0 1 0 0 0 1 0 0 0 1 s\98138s02.dat
  [1,16,0,0,0,1,0,0,0,1,0,0,0,1, ldraw_lib__s__98138s02()],
// 1 16 0 0 0 1 0 0 0 1 0 0 0 1 4-4ring9.dat
  [1,16,0,0,0,1,0,0,0,1,0,0,0,1, ldraw_lib__4_4ring9()],
];
module ldraw_lib__s__98138s01(step=0, col=false, unit=2/5, alt=false, line=0.2, solid=!$preview)
    makepoly(ldraw_lib__s__98138s01(), step=step, col=col, unit=unit, alt=alt, line=line, solid=solid);
ldraw_lib__s__98138s01(line=0.2);
// file: s/98138pz0s01.scad
use <../../lib.scad>
use <../../p/4-4ering.scad>
function ldraw_lib__s__98138pz0s01() = [
// 0 ~Tile  1 x  1 Round with Two White Squares Pattern
// 0 Name: s\98138pz0s01.dat
// 0 Author: Vincent Messenet [Cheenzo]
// 0 !LDRAW_ORG Subpart UPDATE 2023-03
// 0 !LICENSE Licensed under CC BY 4.0 : see CAreadme.txt
// 
// 0 BFC CERTIFY CCW
  [0,"BFC","CERTIFY"],
  [0,"BFC","CCW"],
// 
// 0 !HISTORY 2023-06-24 [OrionP] Official Update 2023-03
// 
// 
// 1 16 0 0 0 9 0 0 0 1 0 0 0 9 4-4ering.dat
  [1,16,0,0,0,9,0,0,0,1,0,0,0,9, ldraw_lib__4_4ering()],
// 
// 4 15 -5 0 6 -5 0 -1 2 0 -1 2 0 6
  [4,15,-5,0,6,-5,0,-1,2,0,-1,2,0,6],
// 4 15 2.5 0 -2.5 2.5 0 -5.5 5.5 0 -5.5 5.5 0 -2.5
  [4,15,2.5,0,-2.5,2.5,0,-5.5,5.5,0,-5.5,5.5,0,-2.5],
// 4 16 -5 0 6 2 0 6 0 0 9 -3.4443 0 8.3151
  [4,16,-5,0,6,2,0,6,0,0,9,-3.4443,0,8.3151],
// 4 16 -8.3151 0 3.4443 -5 0 6 -3.4443 0 8.3151 -6.3639 0 6.3639
  [4,16,-8.3151,0,3.4443,-5,0,6,-3.4443,0,8.3151,-6.3639,0,6.3639],
// 4 16 -5 0 -1 -5 0 6 -8.3151 0 3.4443 -9 0 0
  [4,16,-5,0,-1,-5,0,6,-8.3151,0,3.4443,-9,0,0],
// 4 16 -5 0 -1 -9 0 0 -8.3151 0 -3.4443 -6.3639 0 -6.3639
  [4,16,-5,0,-1,-9,0,0,-8.3151,0,-3.4443,-6.3639,0,-6.3639],
// 4 16 -5 0 -1 -6.3639 0 -6.3639 -3.4443 0 -8.3151 2 0 -1
  [4,16,-5,0,-1,-6.3639,0,-6.3639,-3.4443,0,-8.3151,2,0,-1],
// 4 16 2.5 0 -2.5 2 0 -1 -3.4443 0 -8.3151 2.5 0 -5.5
  [4,16,2.5,0,-2.5,2,0,-1,-3.4443,0,-8.3151,2.5,0,-5.5],
// 4 16 2.5 0 -5.5 -3.4443 0 -8.3151 0 0 -9 3.4443 0 -8.3151
  [4,16,2.5,0,-5.5,-3.4443,0,-8.3151,0,0,-9,3.4443,0,-8.3151],
// 4 16 5.5 0 -5.5 2.5 0 -5.5 3.4443 0 -8.3151 6.3639 0 -6.3639
  [4,16,5.5,0,-5.5,2.5,0,-5.5,3.4443,0,-8.3151,6.3639,0,-6.3639],
// 4 16 5.5 0 -5.5 6.3639 0 -6.3639 8.3151 0 -3.4443 5.5 0 -2.5
  [4,16,5.5,0,-5.5,6.3639,0,-6.3639,8.3151,0,-3.4443,5.5,0,-2.5],
// 3 16 9 0 0 2 0 -1 5.5 0 -2.5
  [3,16,9,0,0,2,0,-1,5.5,0,-2.5],
// 3 16 5.5 0 -2.5 8.3151 0 -3.4443 9 0 0
  [3,16,5.5,0,-2.5,8.3151,0,-3.4443,9,0,0],
// 3 16 2 0 -1 2.5 0 -2.5 5.5 0 -2.5
  [3,16,2,0,-1,2.5,0,-2.5,5.5,0,-2.5],
// 4 16 2 0 6 2 0 -1 9 0 0 8.3151 0 3.4443
  [4,16,2,0,6,2,0,-1,9,0,0,8.3151,0,3.4443],
// 4 16 2 0 6 8.3151 0 3.4443 6.3639 0 6.3639 3.4443 0 8.3151
  [4,16,2,0,6,8.3151,0,3.4443,6.3639,0,6.3639,3.4443,0,8.3151],
// 3 16 0 0 9 2 0 6 3.4443 0 8.3151
  [3,16,0,0,9,2,0,6,3.4443,0,8.3151],
];
module ldraw_lib__s__98138pz0s01(step=0, col=false, unit=2/5, alt=false, line=0.2, solid=!$preview)
    makepoly(ldraw_lib__s__98138pz0s01(), step=step, col=col, unit=unit, alt=alt, line=line, solid=solid);
ldraw_lib__s__98138pz0s01(line=0.2);
// main file
use <../lib.scad>
use <s/98138pz0s01.scad>
use <s/98138s01.scad>
function ldraw_lib__98138pz1() = [
// 0 Tile  1 x  1 Round with Two White Squares Within Black Round Pattern
// 0 Name: 98138pz1.dat
// 0 Author: Vincent Messenet [Cheenzo]
// 0 !LDRAW_ORG Part UPDATE 2023-03
// 0 !LICENSE Licensed under CC BY 4.0 : see CAreadme.txt
// 
// 0 BFC CERTIFY CCW
  [0,"BFC","CERTIFY"],
  [0,"BFC","CCW"],
// 
// 0 !KEYWORDS Brickheadz, bricklink 98138pb090, BrickOwl 237245, Eye, Harry Potter
// 0 !KEYWORDS Hedwig, Rebrickable 98138pr0093, Set 41615
// 
// 0 !HISTORY 2019-06-28 [PTadmin] Official Update 2019-01
// 0 !HISTORY 2023-04-21 [Cheenzo] Updated to use subfile, added keywords
// 0 !HISTORY 2023-06-24 [OrionP] Official Update 2023-03
// 
// 
// 1 16 0 0 0 1 0 0 0 1 0 0 0 1 s\98138s01.dat
  [1,16,0,0,0,1,0,0,0,1,0,0,0,1, ldraw_lib__s__98138s01()],
// 1 0 0 0 0 1 0 0 0 1 0 0 0 1 s\98138pz0s01.dat
  [1,0,0,0,0,1,0,0,0,1,0,0,0,1, ldraw_lib__s__98138pz0s01()],
];
module ldraw_lib__98138pz1(step=0, col=false, unit=2/5, alt=false, line=0.2, solid=!$preview)
    makepoly(ldraw_lib__98138pz1(), step=step, col=col, unit=unit, alt=alt, line=line, solid=solid);
ldraw_lib__98138pz1(line=0.2);
